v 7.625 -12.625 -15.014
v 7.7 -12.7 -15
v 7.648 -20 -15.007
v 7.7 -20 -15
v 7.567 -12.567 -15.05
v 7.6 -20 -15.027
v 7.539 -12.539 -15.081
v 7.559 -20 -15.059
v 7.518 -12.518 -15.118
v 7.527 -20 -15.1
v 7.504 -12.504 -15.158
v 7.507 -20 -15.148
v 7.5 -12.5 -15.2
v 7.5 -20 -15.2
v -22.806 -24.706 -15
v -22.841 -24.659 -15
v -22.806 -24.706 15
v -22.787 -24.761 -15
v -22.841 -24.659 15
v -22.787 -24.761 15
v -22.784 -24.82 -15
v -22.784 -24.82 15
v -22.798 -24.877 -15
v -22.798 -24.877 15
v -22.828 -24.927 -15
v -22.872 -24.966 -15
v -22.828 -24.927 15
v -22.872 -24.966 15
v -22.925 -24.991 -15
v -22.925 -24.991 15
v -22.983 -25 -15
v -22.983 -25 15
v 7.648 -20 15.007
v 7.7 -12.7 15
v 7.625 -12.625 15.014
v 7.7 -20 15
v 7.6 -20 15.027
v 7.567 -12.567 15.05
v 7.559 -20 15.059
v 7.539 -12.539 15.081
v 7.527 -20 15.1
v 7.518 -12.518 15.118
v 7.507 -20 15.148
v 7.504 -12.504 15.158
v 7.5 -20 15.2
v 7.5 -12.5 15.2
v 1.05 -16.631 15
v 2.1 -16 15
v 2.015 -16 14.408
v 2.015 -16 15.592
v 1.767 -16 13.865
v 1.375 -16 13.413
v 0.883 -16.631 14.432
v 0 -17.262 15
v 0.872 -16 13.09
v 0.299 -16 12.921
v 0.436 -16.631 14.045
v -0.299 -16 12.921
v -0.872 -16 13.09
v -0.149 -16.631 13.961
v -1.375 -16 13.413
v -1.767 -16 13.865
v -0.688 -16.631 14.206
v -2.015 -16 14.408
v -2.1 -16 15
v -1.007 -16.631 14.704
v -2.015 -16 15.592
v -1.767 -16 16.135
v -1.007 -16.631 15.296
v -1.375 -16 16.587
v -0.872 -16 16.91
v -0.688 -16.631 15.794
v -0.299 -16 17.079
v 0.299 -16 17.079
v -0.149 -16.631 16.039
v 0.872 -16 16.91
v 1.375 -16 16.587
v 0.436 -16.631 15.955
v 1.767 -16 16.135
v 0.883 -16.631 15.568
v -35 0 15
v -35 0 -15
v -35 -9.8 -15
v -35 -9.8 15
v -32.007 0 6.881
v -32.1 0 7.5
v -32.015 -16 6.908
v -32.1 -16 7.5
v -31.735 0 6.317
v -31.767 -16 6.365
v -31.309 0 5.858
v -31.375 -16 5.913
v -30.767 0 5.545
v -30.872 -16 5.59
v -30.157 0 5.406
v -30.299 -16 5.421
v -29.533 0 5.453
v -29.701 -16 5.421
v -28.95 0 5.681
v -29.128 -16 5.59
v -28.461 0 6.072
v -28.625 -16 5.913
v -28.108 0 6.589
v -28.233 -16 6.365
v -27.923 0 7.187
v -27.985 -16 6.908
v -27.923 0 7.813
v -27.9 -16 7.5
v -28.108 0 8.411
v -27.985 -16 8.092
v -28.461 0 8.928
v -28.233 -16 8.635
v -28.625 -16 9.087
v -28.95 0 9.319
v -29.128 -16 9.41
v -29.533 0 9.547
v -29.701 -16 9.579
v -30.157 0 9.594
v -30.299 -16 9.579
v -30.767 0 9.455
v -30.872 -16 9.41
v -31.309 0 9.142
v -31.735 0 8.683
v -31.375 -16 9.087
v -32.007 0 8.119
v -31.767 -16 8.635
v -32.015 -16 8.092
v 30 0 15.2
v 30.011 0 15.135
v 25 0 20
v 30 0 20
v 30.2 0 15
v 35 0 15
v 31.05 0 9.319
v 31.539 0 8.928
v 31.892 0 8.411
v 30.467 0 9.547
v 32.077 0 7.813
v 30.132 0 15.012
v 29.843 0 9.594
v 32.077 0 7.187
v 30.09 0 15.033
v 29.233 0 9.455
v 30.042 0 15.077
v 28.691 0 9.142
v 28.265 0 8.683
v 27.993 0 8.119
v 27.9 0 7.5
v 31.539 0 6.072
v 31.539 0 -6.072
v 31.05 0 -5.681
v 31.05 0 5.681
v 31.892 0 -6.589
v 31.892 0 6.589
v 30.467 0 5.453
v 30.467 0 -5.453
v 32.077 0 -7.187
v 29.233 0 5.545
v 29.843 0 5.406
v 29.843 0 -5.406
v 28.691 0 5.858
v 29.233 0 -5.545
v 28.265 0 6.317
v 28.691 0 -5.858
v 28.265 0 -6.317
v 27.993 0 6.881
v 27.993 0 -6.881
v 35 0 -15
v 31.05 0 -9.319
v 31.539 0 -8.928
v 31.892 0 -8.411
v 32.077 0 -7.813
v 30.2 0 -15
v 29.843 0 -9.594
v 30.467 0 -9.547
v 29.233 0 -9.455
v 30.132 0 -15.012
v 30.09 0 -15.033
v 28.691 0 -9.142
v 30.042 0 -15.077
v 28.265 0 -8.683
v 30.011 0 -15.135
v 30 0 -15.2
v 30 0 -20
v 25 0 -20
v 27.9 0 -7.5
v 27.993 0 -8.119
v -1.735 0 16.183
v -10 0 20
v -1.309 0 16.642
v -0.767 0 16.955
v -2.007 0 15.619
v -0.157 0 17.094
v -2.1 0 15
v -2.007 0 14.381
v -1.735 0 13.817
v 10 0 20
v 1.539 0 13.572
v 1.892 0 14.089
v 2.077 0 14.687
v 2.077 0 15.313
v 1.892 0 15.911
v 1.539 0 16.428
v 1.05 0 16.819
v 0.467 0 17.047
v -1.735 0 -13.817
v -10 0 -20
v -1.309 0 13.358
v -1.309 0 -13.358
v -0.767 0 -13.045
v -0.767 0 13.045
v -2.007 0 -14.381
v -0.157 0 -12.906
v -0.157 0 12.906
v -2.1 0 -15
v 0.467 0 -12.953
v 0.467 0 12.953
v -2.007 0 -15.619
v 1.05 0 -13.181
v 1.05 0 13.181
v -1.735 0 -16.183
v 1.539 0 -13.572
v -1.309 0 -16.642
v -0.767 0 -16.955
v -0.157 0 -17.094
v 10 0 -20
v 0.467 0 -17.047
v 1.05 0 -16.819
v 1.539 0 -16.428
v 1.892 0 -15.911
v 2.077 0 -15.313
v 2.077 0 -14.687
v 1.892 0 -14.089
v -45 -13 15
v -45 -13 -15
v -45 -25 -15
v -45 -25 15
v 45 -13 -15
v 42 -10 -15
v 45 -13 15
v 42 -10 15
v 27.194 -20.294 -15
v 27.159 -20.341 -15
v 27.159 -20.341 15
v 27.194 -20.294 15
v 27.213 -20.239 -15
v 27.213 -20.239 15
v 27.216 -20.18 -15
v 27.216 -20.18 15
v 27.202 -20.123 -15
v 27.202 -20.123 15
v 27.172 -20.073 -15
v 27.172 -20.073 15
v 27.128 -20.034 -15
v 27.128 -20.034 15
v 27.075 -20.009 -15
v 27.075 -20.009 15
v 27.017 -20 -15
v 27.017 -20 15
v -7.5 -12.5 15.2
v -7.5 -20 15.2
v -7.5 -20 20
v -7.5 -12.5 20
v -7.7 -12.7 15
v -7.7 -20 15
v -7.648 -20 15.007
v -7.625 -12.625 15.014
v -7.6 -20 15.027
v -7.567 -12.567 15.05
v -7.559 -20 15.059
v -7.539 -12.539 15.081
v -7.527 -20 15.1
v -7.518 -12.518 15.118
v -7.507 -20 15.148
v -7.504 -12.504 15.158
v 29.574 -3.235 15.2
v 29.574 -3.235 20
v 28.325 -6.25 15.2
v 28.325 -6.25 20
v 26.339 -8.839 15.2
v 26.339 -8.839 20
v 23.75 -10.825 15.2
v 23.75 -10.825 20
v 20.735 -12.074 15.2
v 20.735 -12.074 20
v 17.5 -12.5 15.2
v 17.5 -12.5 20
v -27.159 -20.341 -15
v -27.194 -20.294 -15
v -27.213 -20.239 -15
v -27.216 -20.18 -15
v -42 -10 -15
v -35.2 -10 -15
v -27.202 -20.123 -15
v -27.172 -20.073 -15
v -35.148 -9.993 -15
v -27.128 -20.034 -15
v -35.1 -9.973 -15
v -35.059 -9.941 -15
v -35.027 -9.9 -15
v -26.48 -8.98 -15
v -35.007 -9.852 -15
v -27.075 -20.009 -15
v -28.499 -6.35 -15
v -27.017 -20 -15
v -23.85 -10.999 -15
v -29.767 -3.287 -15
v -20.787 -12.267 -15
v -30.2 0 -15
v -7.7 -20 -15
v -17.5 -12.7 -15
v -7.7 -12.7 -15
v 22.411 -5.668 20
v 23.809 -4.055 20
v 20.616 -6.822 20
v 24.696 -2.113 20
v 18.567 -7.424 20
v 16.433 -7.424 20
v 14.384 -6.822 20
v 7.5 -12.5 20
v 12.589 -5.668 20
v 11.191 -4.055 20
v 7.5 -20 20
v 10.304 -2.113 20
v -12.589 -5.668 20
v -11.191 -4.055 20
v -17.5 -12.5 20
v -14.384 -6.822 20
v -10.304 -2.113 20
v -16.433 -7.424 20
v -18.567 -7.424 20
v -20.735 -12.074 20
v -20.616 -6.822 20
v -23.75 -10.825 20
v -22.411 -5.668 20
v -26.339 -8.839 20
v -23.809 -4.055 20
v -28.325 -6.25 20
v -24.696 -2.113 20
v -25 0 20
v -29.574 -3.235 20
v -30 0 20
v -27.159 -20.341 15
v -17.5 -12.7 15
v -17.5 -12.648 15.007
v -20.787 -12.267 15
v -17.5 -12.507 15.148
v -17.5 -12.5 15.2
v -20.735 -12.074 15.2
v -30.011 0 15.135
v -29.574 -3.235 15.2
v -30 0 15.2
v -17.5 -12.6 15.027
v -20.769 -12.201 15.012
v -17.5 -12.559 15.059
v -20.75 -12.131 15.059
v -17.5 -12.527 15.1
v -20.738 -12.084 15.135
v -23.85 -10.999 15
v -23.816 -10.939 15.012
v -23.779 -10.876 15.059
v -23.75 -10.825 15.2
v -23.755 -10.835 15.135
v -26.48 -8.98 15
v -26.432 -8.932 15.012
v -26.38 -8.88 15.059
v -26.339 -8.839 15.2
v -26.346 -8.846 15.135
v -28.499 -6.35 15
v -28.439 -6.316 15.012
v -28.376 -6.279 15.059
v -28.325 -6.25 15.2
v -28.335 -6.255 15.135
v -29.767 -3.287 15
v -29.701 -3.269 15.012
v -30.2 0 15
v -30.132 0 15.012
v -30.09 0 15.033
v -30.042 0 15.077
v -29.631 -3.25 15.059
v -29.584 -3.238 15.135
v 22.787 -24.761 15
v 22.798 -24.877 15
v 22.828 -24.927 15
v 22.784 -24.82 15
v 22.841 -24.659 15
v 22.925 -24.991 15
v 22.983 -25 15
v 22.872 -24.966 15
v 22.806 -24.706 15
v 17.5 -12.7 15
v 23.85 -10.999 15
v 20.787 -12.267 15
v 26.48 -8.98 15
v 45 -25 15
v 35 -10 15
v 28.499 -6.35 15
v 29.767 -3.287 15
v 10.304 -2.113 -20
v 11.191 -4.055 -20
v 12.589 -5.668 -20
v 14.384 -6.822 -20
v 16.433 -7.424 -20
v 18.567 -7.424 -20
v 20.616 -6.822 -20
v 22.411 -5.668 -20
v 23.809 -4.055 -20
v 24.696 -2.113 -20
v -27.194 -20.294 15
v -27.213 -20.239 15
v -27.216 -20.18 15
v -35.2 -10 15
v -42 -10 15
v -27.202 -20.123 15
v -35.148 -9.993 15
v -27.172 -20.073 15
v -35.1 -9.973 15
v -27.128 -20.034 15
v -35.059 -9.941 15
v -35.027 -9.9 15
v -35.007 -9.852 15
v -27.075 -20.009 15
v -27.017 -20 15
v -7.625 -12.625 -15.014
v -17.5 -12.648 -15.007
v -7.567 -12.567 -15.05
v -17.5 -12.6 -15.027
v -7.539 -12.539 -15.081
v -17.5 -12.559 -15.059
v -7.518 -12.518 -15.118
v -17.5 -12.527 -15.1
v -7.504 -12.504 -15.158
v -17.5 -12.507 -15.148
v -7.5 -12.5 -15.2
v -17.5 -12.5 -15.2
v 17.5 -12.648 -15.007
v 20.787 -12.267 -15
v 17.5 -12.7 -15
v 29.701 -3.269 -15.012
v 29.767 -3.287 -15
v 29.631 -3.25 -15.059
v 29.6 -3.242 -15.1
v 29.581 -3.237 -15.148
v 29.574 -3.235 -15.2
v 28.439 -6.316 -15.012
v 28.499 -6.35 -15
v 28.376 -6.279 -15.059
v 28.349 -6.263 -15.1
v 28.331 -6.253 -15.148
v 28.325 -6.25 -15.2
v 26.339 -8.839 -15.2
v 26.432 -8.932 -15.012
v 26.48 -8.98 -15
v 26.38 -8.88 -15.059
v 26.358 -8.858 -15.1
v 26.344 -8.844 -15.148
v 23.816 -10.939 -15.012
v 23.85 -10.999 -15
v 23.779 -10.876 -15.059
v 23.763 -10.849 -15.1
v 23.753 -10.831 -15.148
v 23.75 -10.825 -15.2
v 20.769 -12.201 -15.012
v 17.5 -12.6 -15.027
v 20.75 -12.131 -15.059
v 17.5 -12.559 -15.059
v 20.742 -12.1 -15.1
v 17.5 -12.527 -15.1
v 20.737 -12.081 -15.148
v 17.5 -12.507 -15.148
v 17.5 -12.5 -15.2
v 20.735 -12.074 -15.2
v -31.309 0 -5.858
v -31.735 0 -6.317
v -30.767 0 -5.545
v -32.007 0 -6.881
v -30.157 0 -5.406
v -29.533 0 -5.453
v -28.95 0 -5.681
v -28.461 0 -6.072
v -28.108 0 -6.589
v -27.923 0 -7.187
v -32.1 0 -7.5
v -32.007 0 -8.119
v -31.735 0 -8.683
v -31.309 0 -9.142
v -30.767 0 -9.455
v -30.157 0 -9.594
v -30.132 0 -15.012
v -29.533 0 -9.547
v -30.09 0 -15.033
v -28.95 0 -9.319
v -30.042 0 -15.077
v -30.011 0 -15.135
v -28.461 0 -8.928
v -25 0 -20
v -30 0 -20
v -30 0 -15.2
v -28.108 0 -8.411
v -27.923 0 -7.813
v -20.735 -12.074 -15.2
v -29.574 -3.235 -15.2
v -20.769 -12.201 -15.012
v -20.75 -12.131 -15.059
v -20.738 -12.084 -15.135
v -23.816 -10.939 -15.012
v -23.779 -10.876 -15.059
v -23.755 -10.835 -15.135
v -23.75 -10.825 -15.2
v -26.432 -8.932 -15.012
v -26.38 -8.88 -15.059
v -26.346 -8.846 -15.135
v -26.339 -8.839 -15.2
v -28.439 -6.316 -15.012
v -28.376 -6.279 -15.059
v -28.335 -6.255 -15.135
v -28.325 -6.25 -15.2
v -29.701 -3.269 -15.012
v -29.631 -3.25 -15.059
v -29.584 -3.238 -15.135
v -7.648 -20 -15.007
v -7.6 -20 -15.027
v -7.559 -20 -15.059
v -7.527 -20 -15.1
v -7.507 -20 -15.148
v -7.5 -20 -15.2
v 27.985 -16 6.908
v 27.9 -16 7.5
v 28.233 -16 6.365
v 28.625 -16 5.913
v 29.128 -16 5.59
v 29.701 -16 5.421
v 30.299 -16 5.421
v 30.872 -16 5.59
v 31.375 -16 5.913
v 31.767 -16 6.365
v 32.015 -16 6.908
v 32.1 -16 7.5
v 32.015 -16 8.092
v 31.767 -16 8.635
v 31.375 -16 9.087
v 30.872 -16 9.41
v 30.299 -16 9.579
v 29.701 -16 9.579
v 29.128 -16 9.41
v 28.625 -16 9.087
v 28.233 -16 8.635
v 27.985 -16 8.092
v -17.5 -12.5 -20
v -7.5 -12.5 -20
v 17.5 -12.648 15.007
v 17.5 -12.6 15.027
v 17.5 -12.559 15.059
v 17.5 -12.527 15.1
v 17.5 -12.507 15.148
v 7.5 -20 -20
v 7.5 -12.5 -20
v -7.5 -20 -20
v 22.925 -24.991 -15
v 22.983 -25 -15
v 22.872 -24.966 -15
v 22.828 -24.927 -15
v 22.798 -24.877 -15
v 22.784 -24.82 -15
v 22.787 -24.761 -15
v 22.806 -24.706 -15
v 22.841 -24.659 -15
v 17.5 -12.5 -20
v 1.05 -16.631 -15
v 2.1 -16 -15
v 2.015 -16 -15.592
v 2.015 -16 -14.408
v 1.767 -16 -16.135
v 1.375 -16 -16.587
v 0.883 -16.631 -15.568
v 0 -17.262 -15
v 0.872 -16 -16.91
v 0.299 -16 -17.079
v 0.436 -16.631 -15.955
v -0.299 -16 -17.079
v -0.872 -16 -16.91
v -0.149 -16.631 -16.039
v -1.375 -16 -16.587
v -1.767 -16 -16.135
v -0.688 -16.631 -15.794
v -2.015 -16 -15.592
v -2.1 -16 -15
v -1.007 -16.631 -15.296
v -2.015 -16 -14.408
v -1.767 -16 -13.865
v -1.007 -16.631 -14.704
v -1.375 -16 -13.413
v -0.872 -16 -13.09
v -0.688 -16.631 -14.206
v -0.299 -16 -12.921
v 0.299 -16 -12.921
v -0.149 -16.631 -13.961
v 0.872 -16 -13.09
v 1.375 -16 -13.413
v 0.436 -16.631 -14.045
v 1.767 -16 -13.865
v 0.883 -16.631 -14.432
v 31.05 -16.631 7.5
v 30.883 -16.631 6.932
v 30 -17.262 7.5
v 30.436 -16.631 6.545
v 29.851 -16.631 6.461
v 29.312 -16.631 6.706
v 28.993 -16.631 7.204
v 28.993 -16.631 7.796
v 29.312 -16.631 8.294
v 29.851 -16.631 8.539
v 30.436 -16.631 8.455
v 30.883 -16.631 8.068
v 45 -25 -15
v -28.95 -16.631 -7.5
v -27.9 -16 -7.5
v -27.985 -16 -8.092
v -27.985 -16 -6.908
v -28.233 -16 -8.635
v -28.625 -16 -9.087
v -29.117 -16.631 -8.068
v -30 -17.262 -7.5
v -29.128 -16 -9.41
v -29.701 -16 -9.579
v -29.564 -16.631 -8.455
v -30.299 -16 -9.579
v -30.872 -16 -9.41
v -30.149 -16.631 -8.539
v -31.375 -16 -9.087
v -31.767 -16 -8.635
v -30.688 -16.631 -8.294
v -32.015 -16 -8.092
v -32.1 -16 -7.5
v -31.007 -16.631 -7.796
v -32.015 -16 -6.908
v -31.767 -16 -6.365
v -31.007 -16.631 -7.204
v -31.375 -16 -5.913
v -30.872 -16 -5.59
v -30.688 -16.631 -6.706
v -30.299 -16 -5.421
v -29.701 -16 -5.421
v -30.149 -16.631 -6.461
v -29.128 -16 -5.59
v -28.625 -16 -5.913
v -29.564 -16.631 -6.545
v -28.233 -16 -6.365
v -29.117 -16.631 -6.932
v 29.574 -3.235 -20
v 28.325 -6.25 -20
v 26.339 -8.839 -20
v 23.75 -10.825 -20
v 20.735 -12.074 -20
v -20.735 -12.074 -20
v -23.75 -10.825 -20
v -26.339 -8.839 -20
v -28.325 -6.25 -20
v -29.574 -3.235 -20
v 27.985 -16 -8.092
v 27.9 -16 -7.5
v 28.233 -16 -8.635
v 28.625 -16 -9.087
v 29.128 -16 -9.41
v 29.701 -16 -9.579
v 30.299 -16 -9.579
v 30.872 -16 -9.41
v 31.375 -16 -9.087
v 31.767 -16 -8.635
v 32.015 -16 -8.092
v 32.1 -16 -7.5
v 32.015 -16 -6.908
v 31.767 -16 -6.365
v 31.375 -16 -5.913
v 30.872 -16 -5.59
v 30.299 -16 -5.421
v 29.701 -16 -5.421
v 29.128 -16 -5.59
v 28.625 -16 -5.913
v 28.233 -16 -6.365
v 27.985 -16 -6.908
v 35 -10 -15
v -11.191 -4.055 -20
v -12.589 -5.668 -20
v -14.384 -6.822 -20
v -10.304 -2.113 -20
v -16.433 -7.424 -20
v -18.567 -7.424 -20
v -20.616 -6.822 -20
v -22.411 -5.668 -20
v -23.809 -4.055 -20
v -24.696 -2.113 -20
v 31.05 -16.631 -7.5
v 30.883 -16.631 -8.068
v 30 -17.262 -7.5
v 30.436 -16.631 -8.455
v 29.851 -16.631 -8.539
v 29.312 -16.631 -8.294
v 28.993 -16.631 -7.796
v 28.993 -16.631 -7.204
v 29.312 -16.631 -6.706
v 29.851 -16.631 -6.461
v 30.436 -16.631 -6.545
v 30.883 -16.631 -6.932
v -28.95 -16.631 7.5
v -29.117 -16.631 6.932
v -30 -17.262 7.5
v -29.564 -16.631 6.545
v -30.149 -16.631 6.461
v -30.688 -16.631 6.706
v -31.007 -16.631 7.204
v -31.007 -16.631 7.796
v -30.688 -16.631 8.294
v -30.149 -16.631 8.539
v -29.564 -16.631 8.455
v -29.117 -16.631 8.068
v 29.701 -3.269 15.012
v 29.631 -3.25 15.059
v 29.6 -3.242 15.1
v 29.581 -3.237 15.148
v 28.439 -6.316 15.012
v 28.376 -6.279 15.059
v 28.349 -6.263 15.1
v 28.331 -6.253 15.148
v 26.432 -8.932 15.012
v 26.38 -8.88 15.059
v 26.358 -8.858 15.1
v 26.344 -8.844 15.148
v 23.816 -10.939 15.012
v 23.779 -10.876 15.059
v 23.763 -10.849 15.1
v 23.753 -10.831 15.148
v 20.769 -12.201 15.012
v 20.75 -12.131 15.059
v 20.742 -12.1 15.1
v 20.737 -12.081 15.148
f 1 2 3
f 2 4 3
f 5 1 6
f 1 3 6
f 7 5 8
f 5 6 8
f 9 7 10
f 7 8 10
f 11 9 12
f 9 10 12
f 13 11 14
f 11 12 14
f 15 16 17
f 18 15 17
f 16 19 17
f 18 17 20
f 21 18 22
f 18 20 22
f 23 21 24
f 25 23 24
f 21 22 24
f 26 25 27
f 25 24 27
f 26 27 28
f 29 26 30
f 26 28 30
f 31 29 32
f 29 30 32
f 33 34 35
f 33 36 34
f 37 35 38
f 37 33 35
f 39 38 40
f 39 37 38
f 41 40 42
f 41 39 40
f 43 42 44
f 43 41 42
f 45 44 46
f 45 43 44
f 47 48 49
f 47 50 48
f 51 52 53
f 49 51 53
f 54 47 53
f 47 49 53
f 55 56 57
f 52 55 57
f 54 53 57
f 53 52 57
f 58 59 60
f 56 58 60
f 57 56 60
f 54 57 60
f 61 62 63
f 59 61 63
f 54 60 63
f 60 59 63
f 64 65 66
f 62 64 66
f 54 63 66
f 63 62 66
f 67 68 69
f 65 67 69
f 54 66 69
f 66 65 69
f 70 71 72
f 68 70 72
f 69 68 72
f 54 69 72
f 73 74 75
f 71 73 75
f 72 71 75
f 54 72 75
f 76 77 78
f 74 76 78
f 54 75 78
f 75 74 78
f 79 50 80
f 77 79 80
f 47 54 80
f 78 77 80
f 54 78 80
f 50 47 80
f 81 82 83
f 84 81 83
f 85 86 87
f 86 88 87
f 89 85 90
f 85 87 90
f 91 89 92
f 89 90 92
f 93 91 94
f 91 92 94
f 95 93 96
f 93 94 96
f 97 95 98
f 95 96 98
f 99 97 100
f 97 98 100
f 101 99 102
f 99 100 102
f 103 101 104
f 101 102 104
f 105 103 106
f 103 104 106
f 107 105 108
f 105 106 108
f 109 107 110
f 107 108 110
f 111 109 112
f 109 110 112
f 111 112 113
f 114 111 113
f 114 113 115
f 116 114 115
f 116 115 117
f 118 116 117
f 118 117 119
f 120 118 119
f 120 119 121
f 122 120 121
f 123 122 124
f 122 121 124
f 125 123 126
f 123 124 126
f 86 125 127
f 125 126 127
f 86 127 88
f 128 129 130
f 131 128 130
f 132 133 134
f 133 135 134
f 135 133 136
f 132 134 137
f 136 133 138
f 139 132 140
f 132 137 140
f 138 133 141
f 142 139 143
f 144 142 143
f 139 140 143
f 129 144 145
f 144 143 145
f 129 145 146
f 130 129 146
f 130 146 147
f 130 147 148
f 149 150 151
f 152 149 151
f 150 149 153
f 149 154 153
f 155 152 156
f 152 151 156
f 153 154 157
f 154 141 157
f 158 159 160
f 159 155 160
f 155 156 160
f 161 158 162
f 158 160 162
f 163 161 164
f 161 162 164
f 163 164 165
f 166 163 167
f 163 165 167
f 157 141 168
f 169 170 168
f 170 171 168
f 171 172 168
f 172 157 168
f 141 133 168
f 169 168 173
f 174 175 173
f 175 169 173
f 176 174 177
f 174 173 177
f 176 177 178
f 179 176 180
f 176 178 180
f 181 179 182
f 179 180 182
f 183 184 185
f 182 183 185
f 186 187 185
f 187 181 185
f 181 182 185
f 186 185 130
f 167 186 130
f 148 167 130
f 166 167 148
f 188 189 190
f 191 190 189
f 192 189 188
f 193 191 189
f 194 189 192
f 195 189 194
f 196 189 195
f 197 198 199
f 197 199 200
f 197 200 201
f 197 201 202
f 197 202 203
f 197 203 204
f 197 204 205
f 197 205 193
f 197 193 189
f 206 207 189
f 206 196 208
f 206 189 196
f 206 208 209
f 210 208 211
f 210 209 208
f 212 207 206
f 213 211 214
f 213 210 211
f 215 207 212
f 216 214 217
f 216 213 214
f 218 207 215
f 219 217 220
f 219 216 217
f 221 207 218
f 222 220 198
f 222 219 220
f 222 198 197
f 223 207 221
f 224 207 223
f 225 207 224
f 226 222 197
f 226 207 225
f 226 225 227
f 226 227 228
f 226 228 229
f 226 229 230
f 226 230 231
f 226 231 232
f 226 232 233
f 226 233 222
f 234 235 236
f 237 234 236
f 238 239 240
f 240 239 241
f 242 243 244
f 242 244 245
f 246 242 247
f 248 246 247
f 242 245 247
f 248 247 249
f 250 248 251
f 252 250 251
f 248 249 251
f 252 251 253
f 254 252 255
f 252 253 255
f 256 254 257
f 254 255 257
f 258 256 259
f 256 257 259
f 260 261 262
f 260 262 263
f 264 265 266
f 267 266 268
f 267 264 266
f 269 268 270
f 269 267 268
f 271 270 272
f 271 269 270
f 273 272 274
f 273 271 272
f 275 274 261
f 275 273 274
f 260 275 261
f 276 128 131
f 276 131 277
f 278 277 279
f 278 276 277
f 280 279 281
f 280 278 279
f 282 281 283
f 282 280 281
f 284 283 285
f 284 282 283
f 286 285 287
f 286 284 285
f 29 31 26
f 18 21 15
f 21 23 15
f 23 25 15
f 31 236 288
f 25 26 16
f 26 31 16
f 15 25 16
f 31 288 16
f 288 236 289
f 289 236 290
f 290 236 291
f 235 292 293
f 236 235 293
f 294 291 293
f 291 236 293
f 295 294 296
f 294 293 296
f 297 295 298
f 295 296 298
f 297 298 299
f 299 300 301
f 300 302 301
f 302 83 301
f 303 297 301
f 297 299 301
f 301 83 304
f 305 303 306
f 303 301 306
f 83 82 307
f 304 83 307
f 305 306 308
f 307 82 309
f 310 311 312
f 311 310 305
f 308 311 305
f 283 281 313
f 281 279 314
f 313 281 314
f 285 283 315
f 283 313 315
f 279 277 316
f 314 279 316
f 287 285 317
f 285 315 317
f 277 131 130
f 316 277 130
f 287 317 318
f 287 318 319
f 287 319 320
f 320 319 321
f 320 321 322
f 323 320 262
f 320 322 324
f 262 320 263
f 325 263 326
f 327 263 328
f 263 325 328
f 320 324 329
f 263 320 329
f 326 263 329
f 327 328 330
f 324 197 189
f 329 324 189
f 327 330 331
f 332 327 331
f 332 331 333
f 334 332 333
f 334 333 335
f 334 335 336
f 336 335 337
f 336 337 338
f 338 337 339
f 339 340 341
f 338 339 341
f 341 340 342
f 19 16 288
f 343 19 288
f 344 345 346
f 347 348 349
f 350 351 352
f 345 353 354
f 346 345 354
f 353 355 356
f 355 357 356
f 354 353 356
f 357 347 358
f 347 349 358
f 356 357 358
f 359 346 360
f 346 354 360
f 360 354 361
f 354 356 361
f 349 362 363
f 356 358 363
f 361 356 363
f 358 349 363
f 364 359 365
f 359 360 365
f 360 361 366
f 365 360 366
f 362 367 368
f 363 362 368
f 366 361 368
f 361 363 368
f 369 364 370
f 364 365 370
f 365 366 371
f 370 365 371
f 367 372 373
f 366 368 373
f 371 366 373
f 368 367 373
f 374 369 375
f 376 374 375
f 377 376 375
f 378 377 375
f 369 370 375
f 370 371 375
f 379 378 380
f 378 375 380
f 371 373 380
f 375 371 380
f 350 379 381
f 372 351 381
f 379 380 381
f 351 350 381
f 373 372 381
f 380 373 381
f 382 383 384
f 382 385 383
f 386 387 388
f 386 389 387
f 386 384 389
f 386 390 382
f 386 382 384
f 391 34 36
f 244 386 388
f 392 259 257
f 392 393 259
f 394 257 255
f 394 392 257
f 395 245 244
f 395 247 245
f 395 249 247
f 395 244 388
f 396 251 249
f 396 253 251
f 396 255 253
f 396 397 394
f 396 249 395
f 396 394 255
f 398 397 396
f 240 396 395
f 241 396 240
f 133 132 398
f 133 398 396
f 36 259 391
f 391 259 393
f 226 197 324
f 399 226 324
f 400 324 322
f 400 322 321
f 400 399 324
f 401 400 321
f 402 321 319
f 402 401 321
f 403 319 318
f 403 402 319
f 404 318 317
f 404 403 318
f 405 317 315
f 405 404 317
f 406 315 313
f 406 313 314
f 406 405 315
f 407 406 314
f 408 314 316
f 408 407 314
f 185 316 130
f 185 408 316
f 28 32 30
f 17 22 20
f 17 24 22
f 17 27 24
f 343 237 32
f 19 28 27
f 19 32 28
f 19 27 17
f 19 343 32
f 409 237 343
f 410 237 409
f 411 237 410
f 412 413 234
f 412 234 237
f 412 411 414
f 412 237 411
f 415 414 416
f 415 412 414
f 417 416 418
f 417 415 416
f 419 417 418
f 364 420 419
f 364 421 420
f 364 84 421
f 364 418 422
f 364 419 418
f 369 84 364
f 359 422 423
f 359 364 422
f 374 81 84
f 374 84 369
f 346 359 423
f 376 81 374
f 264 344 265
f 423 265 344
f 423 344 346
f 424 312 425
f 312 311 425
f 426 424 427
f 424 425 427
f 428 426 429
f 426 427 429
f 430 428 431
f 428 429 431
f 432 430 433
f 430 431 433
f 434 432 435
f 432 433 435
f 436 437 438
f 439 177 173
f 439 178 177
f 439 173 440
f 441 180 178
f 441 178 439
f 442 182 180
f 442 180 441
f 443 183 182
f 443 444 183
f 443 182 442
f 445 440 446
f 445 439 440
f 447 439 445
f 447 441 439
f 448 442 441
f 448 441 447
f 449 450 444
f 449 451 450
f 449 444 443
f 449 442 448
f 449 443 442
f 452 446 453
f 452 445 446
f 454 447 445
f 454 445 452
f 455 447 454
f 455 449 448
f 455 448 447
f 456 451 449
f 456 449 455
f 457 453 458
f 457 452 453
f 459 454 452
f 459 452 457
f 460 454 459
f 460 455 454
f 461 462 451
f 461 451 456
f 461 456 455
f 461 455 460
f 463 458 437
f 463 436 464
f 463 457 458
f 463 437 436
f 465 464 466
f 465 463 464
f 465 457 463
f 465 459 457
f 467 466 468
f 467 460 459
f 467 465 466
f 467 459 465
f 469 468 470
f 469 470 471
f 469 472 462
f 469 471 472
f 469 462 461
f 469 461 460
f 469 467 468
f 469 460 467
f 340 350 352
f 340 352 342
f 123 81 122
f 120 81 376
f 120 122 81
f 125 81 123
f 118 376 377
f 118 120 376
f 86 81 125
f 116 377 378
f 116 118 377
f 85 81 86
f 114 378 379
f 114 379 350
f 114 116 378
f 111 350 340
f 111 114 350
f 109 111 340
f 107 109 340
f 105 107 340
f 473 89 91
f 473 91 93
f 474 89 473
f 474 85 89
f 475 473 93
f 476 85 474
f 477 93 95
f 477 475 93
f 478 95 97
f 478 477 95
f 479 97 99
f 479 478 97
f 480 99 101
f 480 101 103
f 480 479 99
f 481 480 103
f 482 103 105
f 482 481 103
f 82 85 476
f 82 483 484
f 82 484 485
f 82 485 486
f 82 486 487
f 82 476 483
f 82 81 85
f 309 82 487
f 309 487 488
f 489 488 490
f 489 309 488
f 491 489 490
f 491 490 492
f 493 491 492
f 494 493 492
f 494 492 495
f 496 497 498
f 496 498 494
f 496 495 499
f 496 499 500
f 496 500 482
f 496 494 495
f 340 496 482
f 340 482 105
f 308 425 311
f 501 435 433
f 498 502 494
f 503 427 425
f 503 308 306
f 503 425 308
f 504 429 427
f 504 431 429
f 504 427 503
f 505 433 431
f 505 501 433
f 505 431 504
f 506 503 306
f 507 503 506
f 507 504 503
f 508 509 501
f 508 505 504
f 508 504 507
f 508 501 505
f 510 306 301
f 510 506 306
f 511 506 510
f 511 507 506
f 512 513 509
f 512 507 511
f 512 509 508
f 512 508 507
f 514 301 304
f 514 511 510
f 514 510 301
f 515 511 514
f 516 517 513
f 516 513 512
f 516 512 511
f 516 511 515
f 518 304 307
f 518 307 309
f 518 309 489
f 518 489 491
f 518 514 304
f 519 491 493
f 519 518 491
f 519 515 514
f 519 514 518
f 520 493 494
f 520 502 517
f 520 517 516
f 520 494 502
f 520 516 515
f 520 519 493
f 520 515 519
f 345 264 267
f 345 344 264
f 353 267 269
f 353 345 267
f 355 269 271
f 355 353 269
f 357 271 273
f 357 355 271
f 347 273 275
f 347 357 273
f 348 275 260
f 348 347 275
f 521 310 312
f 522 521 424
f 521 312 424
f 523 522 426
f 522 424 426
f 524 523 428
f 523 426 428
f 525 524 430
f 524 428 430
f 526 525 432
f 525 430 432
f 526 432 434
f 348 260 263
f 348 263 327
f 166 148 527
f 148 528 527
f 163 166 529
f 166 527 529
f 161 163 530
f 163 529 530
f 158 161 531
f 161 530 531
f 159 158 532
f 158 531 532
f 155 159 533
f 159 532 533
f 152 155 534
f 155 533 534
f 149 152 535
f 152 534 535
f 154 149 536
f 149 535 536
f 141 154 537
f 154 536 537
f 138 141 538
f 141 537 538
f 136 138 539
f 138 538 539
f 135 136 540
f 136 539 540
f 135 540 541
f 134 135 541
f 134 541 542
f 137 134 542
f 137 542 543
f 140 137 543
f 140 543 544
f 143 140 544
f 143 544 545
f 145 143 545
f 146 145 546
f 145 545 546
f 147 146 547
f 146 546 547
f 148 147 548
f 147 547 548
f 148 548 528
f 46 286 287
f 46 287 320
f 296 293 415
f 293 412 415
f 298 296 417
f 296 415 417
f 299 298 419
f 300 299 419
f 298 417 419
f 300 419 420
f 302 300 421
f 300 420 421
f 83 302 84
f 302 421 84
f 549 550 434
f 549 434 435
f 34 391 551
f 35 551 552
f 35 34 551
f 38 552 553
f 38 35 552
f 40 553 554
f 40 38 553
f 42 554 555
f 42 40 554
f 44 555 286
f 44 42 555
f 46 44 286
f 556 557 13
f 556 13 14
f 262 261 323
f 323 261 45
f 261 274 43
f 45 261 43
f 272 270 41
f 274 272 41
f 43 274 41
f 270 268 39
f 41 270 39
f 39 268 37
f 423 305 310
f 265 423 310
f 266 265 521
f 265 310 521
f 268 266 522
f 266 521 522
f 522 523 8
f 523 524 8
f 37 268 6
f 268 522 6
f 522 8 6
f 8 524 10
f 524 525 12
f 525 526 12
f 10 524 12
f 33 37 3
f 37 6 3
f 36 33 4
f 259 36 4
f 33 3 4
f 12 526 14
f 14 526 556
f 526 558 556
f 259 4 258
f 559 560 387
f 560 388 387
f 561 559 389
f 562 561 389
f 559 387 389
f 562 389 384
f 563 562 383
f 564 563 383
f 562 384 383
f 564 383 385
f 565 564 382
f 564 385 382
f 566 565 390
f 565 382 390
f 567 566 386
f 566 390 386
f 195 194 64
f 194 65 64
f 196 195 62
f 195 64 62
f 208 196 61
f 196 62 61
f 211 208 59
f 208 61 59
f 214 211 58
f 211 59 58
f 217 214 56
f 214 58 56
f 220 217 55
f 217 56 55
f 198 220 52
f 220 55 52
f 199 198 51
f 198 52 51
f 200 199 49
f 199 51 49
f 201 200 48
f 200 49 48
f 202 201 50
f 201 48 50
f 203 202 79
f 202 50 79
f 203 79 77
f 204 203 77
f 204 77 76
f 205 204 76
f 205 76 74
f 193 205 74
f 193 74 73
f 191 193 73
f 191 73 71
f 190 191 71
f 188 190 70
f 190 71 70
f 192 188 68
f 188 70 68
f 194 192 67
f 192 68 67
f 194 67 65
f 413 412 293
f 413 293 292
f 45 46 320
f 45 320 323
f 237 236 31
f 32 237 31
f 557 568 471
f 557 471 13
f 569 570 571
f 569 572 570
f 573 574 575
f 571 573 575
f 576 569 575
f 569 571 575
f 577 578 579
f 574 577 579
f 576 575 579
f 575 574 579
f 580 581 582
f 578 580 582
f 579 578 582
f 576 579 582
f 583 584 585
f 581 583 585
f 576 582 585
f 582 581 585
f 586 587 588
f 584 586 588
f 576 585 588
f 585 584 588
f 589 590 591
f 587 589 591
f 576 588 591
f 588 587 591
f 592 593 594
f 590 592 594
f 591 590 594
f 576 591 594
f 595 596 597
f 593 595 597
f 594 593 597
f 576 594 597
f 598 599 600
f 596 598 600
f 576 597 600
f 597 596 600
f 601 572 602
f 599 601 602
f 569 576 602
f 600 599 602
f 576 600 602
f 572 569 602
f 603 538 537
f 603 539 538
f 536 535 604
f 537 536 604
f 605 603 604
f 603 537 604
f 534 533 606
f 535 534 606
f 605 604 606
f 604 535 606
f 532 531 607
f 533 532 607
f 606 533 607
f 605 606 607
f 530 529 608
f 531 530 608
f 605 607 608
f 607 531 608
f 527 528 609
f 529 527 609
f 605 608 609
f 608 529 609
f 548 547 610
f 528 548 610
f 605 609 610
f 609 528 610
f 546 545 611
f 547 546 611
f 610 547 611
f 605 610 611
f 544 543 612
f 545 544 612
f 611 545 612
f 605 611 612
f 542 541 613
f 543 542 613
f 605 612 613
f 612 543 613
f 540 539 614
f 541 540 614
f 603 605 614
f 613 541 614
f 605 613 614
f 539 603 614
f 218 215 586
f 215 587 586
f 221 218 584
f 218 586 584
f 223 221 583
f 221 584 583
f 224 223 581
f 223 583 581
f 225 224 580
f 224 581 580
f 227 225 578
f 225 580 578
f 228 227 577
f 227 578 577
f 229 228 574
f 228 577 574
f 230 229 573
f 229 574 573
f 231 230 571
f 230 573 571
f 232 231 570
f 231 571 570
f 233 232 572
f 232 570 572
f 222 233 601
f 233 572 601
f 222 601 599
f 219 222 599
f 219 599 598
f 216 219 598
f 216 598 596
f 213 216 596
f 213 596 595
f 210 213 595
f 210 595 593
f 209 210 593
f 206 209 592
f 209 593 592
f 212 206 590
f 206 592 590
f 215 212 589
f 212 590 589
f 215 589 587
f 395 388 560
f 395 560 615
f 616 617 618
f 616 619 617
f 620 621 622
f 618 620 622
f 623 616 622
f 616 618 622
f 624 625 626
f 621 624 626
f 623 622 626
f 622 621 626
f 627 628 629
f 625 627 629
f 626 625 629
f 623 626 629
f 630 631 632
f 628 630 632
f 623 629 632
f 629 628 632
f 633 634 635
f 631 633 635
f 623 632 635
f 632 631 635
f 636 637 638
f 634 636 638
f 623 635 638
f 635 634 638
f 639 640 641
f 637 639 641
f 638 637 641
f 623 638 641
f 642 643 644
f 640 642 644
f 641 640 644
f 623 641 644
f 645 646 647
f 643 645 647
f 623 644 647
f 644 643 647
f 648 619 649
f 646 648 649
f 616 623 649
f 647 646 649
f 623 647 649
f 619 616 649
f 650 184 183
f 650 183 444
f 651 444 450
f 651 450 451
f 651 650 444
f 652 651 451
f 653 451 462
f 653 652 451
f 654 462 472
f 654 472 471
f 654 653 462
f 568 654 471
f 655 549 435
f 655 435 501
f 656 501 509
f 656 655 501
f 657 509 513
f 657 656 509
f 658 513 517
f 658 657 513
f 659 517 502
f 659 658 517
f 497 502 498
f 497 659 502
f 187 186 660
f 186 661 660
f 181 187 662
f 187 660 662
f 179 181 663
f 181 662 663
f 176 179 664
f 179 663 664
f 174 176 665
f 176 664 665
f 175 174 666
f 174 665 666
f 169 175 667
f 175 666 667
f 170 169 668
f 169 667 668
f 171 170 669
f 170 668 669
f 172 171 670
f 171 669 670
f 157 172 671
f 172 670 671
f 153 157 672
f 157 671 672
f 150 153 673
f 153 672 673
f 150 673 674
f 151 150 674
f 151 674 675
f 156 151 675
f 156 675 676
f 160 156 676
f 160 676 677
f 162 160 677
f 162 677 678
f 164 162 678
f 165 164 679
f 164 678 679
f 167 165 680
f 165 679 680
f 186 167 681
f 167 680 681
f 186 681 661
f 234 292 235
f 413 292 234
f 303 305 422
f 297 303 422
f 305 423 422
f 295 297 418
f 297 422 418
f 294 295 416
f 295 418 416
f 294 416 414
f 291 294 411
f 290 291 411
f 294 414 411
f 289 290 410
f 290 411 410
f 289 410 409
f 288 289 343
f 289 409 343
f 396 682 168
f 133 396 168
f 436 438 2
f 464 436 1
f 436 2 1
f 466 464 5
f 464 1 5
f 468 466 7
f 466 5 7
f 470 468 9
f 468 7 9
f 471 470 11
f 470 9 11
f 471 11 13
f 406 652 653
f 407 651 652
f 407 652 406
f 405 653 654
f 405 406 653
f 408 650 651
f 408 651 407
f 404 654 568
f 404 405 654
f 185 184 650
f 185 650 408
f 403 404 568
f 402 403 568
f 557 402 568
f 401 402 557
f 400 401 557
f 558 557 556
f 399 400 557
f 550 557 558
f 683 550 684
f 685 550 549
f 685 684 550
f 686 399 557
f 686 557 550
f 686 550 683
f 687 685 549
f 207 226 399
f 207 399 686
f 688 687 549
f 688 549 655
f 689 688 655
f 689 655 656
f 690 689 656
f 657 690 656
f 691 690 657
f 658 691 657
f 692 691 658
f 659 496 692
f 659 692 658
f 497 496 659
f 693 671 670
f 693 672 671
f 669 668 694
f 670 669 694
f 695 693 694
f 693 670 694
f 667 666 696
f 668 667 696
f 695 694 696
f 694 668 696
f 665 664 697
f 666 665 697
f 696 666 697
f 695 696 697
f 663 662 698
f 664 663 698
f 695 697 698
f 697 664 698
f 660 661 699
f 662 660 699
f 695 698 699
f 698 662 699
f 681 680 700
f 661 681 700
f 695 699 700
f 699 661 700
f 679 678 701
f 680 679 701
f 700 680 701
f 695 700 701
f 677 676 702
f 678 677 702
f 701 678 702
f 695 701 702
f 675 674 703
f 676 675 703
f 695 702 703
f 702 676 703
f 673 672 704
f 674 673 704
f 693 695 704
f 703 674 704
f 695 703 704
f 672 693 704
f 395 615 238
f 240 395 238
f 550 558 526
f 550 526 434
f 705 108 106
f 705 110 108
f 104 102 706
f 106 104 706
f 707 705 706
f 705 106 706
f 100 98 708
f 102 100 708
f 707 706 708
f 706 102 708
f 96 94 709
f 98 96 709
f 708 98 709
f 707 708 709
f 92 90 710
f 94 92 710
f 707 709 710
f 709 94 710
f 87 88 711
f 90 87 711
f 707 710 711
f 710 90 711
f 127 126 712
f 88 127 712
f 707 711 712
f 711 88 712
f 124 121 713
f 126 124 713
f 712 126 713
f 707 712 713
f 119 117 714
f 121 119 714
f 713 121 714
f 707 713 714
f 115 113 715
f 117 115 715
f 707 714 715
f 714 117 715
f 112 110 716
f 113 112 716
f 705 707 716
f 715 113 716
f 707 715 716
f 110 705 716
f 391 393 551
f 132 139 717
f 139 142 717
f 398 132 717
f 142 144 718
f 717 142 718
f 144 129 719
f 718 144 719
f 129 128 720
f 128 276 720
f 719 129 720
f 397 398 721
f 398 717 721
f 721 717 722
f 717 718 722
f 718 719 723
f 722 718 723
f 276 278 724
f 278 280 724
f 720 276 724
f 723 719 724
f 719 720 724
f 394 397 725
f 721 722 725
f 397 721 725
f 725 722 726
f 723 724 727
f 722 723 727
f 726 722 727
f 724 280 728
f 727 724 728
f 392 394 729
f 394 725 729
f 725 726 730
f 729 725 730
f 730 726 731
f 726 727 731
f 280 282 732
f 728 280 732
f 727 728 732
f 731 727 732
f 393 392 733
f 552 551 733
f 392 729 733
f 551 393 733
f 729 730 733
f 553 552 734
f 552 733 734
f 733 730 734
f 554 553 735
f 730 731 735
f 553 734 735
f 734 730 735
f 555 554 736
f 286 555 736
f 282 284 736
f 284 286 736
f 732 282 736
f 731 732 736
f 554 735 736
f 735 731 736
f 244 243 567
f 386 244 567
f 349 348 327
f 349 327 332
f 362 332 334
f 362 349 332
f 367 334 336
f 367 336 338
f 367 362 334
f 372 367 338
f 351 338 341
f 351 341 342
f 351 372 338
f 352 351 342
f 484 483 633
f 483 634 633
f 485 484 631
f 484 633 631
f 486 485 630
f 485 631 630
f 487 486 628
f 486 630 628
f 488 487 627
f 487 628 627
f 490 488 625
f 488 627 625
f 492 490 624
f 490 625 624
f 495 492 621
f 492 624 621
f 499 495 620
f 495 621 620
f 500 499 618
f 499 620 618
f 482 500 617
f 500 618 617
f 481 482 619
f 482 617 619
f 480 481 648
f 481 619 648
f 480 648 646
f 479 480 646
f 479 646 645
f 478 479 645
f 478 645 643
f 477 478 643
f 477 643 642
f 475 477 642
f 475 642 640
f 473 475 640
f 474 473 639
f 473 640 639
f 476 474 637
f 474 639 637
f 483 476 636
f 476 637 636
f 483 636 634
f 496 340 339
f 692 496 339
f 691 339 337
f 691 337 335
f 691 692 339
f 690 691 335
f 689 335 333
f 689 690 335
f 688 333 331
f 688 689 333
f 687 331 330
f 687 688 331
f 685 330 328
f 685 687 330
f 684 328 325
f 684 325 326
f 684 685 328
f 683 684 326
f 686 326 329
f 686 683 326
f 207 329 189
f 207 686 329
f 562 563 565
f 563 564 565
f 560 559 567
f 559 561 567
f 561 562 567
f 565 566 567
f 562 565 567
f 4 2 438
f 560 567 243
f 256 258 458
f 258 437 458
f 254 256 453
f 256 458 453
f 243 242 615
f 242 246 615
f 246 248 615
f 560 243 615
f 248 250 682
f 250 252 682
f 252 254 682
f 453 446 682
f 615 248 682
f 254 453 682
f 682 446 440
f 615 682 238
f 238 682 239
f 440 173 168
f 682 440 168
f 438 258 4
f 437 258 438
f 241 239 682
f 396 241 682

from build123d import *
from build123d.topology import SkipClean

# Parameters (mm, degrees)
EXTRUDE_1_DEPTH       = 20
EXTRUDE_1_DEPTH_BACK  = 20
EXTRUDE_2_DEPTH       = 15
EXTRUDE_2_DEPTH_BACK  = 15
HOLE_WIZARD_M51_D     = 4.2
HOLE_WIZARD_M51_DEPTH = 16
HOLE_WIZARD_M51_TIP   = 1.2618073
CHAMFER_1_SIZE        = 3
FILLET_1_R            = 0.2
FILLET_2_R            = 0.2
FILLET_3_R            = 0.2


with BuildPart() as part:
    # Эскиз1 → Бобышка-Вытянуть1 (new, two sides: drawn at the far end of the back side and taken through both)
    with BuildSketch(Plane.XY.offset(-EXTRUDE_1_DEPTH_BACK)):
        with BuildLine():
            Line((17.5, -12.5), (7.5, -12.5))
            Line((7.5, -12.5), (7.5, -20))
            Line((7.5, -20), (-7.5, -20))
            Line((-7.5, -20), (-7.5, -12.5))
            Line((-7.5, -12.5), (-17.5, -12.5))
            ThreePointArc((-17.5, -12.5), (-26.338834765, -8.838834765), (-30, 0))
            Line((-30, 0), (-25, 0))
            ThreePointArc((-25, 0), (-17.5, -7.5), (-10, 0))
            Line((-10, 0), (10, 0))
            ThreePointArc((10, 0), (17.5, -7.5), (25, 0))
            Line((25, 0), (30, 0))
            ThreePointArc((30, 0), (26.338834765, -8.838834765), (17.5, -12.5))
        make_face()
    extrude(amount=EXTRUDE_1_DEPTH + EXTRUDE_1_DEPTH_BACK)

    # Эскиз2 → Бобышка-Вытянуть2 (add, two sides: drawn at the far end of the back side and taken through both)
    with SkipClean():  # the faces are left unmerged after this step: merging them gives an invalid solid
        with BuildSketch(Plane.XY.offset(-EXTRUDE_2_DEPTH_BACK)):
            with BuildLine():
                Line((22.5, -25), (45, -25))
                Line((45, -25), (45, -10))
                Line((45, -10), (35, -10))
                Line((35, -10), (35, 0))
                Line((35, 0), (25, 0))
                ThreePointArc((25, 0), (17.5, -7.5), (10, 0))
                Line((10, 0), (-10, 0))
                ThreePointArc((-10, 0), (-17.5, -7.5), (-25, 0))
                Line((-25, 0), (-35, 0))
                Line((-35, 0), (-35, -10))
                Line((-35, -10), (-45, -10))
                Line((-45, -10), (-45, -25))
                Line((-45, -25), (-22.5, -25))
                Line((-22.5, -25), (-27.5, -20))
                Line((-27.5, -20), (27.5, -20))
                Line((27.5, -20), (22.5, -25))
            make_face()
        extrude(amount=EXTRUDE_2_DEPTH + EXTRUDE_2_DEPTH_BACK)
    add(part.part.scale(1), mode=Mode.REPLACE)  # the faces are merged on a copy

    # Отверстие обработанное метчиком M51
    with Locations(Plane(origin=(0, 0, 0), x_dir=(1, 0, 0), z_dir=(0, 1, 0))):
        with Locations((-30, 7.5), (-30, -7.5), (0, 15), (0, -15), (30, -7.5), (30, 7.5)):
            Hole(HOLE_WIZARD_M51_D / 2, depth=HOLE_WIZARD_M51_DEPTH)
            with Locations((0, 0, -(HOLE_WIZARD_M51_DEPTH + HOLE_WIZARD_M51_TIP / 2))):  # 118° drill point
                Cone(0, HOLE_WIZARD_M51_D / 2, HOLE_WIZARD_M51_TIP, mode=Mode.SUBTRACT)

    # Фаска1
    chamfer_1_edges = [part.edges().sort_by_distance(p)[0] for p in [
        (-45, -10, 0),
        (45, -10, 0),
    ]]
    chamfer(chamfer_1_edges, length=CHAMFER_1_SIZE)

    # Скругление1
    fillet_1_edges = [part.edges().sort_by_distance(p)[0] for p in [
        (27.5, -20, 0),
        (22.5, -25, 0),
        (-27.5, -20, 0),
        (-22.5, -25, 0),
    ]]
    fillet(fillet_1_edges, radius=FILLET_1_R)

    # Скругление2
    fillet_2_edges = [part.edges().sort_by_distance(p)[0] for p in [
        (-35, -10, 0),
    ]]
    fillet(fillet_2_edges, radius=FILLET_2_R)

    # Скругление3
    fillet_3_edges = [part.edges().sort_by_distance(p)[0] for p in [
        (-12.5, -12.5, 15),
        (-12.5, -12.5, -15),
        (12.5, -12.5, -15),
        (26.338834765, -8.838834765, -15),
        (7.5, -16.25, -15),
        (12.5, -12.5, 15),
        (26.338834765, -8.838834765, 15),
        (-26.338834765, -8.838834765, 15),
        (-7.5, -16.25, 15),
        (7.5, -16.25, 15),
        (-26.338834765, -8.838834765, -15),
        (-7.5, -16.25, -15),
    ]]
    fillet(fillet_3_edges, radius=FILLET_3_R)


solid = part.part
